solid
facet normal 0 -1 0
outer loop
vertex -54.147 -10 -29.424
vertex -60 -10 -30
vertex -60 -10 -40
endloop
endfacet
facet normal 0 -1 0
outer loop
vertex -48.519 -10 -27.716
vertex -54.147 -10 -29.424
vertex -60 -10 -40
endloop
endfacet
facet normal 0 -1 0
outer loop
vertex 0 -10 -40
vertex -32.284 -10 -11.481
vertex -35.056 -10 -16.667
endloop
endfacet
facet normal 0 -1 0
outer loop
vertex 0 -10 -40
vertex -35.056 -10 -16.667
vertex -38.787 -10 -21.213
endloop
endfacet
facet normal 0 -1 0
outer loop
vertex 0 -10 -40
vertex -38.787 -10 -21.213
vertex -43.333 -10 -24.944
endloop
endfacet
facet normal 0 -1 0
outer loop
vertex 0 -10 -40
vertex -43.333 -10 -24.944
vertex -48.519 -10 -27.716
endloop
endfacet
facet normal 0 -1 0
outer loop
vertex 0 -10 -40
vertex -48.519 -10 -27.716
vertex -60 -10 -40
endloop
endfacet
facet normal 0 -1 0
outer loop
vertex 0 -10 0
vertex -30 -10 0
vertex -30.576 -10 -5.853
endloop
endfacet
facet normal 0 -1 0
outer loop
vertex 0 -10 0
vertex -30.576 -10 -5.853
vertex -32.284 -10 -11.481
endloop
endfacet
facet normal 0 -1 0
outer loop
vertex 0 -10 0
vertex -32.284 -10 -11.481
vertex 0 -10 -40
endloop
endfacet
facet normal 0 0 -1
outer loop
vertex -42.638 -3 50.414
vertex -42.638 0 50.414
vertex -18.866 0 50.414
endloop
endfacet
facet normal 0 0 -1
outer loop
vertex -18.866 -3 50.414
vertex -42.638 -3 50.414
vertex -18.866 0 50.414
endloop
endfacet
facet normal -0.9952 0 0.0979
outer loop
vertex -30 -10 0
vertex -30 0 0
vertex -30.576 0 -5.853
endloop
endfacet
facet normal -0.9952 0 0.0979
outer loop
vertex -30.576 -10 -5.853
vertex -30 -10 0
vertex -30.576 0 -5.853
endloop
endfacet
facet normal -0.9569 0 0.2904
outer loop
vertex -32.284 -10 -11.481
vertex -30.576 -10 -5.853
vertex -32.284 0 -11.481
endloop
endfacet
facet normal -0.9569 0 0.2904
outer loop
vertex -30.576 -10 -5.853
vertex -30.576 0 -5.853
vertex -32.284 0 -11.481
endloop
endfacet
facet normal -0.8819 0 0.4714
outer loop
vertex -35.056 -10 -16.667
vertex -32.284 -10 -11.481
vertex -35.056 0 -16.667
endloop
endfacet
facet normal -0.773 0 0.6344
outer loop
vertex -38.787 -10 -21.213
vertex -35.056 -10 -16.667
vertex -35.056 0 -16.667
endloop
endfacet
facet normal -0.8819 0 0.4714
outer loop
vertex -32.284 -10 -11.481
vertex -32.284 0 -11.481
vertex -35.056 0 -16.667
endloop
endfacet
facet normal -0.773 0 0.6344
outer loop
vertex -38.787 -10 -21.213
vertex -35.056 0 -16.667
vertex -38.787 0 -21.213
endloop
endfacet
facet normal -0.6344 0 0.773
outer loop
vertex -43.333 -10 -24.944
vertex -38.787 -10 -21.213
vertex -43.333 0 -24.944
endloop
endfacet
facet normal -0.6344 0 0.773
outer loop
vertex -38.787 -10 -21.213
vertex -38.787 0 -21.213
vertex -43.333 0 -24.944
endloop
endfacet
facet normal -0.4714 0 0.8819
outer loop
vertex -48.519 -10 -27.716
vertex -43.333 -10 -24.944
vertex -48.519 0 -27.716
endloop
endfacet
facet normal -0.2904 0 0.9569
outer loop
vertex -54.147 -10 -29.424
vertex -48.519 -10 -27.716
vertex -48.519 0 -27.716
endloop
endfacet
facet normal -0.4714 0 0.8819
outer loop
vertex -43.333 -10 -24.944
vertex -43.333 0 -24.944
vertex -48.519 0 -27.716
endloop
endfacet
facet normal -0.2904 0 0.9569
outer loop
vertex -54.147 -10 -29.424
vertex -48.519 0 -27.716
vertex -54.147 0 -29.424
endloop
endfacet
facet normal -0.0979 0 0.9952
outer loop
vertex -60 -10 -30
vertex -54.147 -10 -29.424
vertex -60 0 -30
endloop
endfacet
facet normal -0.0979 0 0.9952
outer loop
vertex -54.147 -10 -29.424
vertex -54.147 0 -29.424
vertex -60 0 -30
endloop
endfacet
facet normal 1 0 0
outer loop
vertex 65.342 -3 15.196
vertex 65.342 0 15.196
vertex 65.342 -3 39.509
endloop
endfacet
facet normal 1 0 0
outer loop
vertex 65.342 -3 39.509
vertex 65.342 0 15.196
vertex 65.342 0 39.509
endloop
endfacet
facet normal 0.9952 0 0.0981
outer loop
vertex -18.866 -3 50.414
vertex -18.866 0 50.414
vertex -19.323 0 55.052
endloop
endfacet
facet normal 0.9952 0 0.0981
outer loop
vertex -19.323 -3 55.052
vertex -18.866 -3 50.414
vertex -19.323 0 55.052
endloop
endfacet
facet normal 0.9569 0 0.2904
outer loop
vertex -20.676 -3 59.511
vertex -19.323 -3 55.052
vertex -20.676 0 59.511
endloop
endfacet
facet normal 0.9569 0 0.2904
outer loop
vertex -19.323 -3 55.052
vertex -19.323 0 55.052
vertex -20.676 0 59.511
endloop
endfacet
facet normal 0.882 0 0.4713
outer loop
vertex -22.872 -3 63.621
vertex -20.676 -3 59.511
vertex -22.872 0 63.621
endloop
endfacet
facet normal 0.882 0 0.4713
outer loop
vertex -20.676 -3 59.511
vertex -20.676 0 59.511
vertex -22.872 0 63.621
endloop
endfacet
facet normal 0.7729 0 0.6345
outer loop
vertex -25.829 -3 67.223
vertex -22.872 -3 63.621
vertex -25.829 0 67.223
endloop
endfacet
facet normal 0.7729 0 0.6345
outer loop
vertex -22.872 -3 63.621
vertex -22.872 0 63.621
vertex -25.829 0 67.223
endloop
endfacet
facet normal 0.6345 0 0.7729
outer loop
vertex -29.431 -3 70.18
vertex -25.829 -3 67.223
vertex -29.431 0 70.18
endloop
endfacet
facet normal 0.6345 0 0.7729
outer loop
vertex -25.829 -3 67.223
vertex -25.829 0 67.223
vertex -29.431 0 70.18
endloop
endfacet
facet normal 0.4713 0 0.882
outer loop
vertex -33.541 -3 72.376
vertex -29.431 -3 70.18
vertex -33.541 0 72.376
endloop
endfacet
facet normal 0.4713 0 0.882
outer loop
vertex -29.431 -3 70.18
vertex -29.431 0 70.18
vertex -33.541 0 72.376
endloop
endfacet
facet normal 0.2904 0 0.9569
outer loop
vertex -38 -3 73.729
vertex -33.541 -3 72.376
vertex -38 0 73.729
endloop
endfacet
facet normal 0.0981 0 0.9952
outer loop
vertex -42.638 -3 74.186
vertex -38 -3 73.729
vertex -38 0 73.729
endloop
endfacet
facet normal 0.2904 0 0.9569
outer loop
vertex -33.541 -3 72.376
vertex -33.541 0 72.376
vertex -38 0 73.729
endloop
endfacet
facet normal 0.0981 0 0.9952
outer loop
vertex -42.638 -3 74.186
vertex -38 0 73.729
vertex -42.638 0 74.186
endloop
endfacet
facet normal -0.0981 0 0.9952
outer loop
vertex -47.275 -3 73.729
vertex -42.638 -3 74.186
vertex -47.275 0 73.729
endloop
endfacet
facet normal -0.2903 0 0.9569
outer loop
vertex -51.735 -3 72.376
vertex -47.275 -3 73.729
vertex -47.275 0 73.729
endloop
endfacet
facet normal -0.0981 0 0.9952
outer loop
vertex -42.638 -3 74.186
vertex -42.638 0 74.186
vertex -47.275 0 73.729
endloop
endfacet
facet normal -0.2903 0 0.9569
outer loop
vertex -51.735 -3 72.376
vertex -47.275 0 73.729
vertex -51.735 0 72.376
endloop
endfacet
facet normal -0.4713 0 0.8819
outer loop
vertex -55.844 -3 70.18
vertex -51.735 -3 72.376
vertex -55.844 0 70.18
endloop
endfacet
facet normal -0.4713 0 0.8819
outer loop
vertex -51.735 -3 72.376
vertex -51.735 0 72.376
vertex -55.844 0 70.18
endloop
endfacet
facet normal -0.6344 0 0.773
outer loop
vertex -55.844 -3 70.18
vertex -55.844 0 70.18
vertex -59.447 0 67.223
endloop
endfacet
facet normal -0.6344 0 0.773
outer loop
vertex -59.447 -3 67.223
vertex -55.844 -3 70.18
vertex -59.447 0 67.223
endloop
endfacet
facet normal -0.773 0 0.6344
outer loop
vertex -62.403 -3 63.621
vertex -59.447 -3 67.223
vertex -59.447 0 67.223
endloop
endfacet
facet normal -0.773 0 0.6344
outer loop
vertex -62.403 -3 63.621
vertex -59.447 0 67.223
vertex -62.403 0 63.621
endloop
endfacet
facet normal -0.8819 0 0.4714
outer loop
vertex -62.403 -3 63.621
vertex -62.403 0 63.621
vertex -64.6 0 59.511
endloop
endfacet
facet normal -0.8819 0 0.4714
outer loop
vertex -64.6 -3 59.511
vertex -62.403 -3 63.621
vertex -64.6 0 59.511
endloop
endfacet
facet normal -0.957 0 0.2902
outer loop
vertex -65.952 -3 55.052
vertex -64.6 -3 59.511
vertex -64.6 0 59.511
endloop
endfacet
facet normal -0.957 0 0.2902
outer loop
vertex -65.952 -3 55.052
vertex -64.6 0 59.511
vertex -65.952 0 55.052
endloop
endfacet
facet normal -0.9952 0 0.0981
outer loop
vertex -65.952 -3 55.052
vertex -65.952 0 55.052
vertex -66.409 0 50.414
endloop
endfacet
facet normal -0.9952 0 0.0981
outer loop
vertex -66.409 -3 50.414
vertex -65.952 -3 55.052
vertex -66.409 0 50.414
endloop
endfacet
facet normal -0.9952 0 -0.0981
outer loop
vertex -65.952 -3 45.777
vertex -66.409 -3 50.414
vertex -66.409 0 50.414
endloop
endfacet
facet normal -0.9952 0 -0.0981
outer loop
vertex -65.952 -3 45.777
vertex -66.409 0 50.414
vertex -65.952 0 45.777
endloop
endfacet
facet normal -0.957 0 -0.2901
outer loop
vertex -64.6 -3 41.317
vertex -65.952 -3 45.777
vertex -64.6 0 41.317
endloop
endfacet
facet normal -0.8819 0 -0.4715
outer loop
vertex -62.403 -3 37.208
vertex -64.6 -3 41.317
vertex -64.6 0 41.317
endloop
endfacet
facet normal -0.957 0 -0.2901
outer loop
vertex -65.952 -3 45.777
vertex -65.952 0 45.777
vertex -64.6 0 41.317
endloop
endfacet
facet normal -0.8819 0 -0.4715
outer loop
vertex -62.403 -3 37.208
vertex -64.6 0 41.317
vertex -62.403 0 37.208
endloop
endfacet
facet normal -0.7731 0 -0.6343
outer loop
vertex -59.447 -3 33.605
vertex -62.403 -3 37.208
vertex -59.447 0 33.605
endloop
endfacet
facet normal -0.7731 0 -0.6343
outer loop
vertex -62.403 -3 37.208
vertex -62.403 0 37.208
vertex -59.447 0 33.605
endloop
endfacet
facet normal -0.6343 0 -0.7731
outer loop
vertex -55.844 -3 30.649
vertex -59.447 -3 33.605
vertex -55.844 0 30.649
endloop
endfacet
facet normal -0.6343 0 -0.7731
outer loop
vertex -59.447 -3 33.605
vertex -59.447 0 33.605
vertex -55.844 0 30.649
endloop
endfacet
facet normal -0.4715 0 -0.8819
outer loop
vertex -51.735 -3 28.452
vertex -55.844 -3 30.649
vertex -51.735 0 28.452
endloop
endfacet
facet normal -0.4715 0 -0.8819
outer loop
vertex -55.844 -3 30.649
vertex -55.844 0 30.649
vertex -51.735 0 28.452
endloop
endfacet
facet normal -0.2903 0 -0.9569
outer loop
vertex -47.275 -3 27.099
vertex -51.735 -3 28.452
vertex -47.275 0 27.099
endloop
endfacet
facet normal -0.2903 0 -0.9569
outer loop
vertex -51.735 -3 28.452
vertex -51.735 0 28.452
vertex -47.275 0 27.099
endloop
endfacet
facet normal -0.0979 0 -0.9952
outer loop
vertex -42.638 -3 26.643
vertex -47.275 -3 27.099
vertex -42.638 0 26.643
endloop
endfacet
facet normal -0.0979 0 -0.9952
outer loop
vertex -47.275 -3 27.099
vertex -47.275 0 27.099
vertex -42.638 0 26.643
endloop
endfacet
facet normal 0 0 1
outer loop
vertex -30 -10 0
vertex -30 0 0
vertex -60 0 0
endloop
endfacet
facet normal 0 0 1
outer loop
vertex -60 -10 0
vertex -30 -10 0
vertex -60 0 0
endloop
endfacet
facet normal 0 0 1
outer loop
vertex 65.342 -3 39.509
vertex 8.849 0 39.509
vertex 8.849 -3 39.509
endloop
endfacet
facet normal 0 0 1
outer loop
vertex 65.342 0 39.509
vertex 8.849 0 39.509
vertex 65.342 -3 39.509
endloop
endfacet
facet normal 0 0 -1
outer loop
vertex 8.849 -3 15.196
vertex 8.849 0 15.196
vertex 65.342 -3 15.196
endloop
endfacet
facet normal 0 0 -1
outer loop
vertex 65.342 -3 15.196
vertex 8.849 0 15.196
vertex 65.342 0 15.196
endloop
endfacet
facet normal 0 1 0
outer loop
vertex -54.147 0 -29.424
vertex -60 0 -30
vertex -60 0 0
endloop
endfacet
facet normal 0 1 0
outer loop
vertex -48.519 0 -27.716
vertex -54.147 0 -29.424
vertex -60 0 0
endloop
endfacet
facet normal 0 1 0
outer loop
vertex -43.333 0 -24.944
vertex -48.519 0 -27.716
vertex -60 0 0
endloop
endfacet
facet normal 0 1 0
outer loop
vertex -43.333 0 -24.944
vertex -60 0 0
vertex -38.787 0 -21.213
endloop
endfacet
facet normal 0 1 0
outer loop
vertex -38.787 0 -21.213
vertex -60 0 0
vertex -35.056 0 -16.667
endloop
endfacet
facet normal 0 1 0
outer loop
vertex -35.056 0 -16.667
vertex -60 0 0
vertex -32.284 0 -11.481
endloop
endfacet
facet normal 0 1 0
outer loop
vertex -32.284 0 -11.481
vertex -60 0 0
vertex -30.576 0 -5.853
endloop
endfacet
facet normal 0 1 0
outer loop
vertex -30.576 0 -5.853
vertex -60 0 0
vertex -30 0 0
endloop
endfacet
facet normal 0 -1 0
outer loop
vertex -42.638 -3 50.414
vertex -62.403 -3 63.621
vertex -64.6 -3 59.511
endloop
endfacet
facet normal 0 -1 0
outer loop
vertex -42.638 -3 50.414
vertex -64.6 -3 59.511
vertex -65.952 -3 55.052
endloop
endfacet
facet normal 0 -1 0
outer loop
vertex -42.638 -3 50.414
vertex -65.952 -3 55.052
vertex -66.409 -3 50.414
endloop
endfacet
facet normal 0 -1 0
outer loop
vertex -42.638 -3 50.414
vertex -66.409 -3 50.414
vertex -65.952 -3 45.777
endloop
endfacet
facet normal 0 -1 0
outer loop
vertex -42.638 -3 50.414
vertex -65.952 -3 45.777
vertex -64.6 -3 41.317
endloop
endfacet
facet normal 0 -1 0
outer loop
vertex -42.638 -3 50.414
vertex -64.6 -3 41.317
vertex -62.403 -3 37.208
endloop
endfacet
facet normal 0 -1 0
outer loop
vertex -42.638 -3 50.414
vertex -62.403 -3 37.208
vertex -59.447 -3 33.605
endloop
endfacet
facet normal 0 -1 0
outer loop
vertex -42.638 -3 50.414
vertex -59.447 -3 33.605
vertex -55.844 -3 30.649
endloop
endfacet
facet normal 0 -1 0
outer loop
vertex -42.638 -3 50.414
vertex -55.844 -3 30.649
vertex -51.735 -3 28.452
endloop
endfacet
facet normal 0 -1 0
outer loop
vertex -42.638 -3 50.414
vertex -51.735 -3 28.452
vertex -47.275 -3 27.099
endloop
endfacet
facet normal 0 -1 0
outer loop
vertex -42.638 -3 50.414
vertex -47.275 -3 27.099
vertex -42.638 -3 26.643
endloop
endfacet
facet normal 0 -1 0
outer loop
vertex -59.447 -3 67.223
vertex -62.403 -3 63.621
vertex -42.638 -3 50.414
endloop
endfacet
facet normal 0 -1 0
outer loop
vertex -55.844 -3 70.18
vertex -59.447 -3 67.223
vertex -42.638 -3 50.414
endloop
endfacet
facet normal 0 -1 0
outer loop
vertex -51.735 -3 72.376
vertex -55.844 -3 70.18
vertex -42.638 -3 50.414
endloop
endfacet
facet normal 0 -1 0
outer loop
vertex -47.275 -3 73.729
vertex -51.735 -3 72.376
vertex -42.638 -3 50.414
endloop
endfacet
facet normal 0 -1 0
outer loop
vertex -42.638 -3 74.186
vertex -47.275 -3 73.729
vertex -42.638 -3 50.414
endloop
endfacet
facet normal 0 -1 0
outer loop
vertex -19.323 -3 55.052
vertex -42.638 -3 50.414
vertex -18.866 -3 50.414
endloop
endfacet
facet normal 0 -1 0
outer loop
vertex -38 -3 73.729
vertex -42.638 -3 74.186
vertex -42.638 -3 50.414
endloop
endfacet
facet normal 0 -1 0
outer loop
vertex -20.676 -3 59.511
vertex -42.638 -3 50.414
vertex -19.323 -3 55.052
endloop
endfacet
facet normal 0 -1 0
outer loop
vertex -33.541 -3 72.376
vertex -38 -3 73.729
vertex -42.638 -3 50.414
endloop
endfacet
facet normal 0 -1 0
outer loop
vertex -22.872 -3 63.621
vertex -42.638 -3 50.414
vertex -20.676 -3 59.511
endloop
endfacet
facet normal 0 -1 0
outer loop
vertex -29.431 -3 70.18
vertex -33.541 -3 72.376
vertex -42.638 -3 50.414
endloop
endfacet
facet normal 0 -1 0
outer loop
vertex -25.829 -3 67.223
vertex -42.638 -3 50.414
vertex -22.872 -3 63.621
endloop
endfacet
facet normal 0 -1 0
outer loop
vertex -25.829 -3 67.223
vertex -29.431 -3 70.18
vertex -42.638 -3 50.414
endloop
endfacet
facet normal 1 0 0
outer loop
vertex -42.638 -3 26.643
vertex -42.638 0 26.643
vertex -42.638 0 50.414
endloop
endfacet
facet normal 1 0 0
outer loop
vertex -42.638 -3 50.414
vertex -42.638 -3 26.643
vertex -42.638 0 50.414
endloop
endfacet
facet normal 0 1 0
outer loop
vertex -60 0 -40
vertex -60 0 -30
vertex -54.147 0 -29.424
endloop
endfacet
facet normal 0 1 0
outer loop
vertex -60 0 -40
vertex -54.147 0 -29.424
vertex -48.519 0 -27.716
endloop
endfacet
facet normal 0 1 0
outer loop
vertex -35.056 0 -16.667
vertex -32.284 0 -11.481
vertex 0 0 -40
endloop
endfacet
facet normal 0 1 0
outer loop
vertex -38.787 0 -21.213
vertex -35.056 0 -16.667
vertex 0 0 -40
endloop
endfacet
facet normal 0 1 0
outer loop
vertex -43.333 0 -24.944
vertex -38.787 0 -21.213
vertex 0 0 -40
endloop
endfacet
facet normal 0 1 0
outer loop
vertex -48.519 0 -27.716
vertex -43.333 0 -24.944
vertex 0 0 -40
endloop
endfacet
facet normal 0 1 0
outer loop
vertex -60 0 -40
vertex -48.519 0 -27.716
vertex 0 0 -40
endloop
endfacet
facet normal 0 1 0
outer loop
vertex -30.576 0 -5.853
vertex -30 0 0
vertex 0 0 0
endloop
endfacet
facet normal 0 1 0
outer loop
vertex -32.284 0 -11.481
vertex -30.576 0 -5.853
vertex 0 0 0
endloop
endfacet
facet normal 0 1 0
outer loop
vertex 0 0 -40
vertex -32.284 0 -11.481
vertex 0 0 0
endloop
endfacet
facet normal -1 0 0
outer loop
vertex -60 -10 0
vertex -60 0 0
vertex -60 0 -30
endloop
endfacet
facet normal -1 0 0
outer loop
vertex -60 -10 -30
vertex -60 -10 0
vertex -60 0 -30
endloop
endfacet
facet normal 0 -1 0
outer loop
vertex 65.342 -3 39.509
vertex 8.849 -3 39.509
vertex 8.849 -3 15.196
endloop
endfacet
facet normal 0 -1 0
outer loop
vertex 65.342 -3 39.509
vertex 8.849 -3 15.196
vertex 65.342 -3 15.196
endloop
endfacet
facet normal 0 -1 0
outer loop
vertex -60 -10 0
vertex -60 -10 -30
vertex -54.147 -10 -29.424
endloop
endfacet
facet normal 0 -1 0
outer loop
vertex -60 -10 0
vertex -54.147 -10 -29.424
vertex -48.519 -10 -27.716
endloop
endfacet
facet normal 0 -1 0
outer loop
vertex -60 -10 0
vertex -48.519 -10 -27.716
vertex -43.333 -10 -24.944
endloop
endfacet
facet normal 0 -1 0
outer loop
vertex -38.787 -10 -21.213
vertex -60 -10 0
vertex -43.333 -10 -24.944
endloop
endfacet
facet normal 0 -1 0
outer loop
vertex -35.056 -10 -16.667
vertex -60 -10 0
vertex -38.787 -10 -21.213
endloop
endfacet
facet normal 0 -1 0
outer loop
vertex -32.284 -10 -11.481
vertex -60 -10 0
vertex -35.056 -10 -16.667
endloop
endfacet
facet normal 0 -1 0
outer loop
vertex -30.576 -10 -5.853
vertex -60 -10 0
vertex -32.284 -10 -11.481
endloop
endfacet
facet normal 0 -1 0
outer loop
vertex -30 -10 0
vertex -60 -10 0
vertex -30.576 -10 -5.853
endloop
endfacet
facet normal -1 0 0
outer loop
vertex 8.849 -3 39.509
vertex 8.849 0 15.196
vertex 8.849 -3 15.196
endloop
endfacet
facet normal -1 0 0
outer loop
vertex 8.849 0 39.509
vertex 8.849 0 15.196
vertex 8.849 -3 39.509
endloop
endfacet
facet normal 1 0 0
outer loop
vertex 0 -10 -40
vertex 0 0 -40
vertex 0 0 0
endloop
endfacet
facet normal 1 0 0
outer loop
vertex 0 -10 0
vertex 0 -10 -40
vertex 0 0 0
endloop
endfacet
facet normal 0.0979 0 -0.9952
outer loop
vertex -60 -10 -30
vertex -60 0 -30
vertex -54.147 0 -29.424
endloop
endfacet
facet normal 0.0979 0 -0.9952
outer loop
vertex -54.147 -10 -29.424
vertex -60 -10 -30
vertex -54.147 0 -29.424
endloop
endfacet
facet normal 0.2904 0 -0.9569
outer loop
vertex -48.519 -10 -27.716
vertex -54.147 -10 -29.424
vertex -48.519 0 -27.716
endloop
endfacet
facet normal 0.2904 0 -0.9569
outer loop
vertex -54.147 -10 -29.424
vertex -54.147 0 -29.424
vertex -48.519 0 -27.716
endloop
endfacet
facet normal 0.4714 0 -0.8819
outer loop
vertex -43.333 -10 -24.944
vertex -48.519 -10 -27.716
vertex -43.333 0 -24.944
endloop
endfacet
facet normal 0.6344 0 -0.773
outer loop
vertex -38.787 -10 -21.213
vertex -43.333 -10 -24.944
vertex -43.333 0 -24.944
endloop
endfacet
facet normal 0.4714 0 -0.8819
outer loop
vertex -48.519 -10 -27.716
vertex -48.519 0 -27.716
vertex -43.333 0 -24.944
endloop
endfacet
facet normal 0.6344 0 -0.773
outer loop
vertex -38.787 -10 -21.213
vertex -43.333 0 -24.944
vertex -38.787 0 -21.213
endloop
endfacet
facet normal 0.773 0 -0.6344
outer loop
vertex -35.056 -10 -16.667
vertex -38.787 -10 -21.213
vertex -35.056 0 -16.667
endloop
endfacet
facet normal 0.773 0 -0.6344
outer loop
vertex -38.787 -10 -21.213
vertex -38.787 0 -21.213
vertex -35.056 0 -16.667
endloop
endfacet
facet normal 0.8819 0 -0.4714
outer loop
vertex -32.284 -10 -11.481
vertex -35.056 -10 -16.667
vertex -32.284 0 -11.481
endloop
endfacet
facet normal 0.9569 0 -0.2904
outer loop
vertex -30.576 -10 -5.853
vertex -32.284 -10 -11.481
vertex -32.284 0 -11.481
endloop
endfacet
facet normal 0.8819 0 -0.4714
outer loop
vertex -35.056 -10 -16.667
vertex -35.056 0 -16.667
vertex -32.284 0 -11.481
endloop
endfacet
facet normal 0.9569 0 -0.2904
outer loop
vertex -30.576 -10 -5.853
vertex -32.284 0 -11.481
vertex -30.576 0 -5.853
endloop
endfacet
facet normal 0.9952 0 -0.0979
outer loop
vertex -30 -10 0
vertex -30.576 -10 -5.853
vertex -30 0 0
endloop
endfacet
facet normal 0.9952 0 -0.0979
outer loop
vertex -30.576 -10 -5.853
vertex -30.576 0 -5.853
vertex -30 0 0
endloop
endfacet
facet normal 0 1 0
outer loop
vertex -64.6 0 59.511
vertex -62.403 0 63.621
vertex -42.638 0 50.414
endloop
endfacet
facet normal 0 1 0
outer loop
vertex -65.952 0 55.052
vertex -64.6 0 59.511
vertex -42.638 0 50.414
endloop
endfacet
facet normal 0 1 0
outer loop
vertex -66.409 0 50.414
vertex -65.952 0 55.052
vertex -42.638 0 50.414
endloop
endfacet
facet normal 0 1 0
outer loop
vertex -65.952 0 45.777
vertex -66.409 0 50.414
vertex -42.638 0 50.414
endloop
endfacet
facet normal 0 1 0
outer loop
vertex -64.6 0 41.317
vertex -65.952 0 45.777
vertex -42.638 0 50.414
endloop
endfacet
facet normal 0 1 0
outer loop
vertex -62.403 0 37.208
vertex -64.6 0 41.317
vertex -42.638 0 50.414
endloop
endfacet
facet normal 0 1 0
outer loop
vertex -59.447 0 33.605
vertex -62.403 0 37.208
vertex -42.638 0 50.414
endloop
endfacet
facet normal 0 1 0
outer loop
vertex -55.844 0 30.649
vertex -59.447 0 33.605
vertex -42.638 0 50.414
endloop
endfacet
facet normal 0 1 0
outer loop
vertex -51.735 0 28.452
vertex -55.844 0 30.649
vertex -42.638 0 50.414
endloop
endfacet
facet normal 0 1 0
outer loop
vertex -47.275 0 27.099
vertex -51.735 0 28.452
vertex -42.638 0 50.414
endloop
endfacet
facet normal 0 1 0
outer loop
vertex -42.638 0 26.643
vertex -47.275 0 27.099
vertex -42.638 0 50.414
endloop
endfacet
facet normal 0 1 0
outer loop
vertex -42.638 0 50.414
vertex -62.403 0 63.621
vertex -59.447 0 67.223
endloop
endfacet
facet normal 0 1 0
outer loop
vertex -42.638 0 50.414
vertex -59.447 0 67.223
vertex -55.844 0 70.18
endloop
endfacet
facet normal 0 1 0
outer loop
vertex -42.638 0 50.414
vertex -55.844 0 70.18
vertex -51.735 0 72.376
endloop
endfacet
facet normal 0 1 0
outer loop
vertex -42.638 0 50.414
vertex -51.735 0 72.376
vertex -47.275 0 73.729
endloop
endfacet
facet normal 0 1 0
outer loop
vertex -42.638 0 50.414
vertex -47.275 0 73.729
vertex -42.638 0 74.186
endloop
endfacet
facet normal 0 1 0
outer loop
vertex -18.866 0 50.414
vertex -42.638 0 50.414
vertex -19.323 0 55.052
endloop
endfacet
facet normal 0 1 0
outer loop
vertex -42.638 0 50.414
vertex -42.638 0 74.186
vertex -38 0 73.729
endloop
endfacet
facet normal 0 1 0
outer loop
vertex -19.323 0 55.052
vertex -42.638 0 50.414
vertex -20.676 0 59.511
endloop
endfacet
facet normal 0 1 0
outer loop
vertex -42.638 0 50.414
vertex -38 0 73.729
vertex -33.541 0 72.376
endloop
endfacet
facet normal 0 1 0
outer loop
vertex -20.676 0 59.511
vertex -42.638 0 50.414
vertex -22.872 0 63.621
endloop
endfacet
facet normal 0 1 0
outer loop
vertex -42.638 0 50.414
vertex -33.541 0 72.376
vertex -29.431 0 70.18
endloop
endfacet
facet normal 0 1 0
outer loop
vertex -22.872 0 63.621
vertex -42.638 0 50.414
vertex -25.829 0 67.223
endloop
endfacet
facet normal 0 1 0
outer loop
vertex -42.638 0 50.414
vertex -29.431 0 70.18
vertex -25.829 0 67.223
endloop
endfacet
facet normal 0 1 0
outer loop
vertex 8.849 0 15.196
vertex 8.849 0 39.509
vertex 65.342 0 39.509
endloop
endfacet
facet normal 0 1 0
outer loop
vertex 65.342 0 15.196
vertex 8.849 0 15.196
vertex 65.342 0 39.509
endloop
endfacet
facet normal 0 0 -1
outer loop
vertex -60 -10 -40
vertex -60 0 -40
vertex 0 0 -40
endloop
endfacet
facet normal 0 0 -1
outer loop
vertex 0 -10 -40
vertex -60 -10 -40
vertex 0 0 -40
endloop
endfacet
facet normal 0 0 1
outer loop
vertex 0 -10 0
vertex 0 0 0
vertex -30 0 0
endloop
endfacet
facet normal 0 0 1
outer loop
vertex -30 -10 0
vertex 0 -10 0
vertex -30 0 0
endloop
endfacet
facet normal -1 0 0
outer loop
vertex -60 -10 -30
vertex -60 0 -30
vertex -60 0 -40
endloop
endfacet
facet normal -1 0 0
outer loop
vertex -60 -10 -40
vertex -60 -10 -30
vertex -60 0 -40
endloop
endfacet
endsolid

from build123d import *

# Parameters (mm, degrees)
F1_DEPTH = 3
F2_W     = 56.4926248044
F2_H     = 24.3132794276
F3_DEPTH = 3
F5_DEPTH = 10
F6_DEPTH = 10


with BuildPart() as f1:
    # F0 (on Front) → F1 (new body)
    with BuildSketch(Plane.XZ):
        with BuildLine():
            Line((-42.6376275718, 50.414301455), (-18.8660464076, 50.414301455))
            ThreePointArc((-18.8660464076, 50.414301455), (-59.4466738126, 67.2233476958), (-42.6376275718, 26.6427202908))
            Line((-42.6376275718, 26.6427202908), (-42.6376275718, 50.414301455))
        make_face()
    extrude(amount=F1_DEPTH)


with BuildPart() as f3:
    # F2 (on Front) → F3 (new body)
    with BuildSketch(Plane.XZ):
        with Locations((37.0956296101, 27.3524406366)):
            Rectangle(F2_W, F2_H)
    extrude(amount=F3_DEPTH)


with BuildPart() as f5:
    # F4 (on Front) → F5 (new body)
    with BuildSketch(Plane.XZ):
        with BuildLine():
            Line((-30, 0), (-60, 0))
            Line((-60, 0), (-60, -30))
            ThreePointArc((-60, -30), (-38.7867965644, -21.2132034356), (-30, 0))
        make_face()
    extrude(amount=F5_DEPTH)


with BuildPart() as f6:
    # F4 (on Front) → F6 (new body)
    with BuildSketch(Plane.XZ):
        with BuildLine():
            Line((0, 0), (-30, 0))
            ThreePointArc((-30, 0), (-38.7867965644, -21.2132034356), (-60, -30))
            Line((-60, -30), (-60, -40))
            Line((-60, -40), (0, -40))
            Line((0, -40), (0, 0))
        make_face()
    extrude(amount=F6_DEPTH)


solid = Compound([f1.part, f3.part, f5.part, f6.part])
